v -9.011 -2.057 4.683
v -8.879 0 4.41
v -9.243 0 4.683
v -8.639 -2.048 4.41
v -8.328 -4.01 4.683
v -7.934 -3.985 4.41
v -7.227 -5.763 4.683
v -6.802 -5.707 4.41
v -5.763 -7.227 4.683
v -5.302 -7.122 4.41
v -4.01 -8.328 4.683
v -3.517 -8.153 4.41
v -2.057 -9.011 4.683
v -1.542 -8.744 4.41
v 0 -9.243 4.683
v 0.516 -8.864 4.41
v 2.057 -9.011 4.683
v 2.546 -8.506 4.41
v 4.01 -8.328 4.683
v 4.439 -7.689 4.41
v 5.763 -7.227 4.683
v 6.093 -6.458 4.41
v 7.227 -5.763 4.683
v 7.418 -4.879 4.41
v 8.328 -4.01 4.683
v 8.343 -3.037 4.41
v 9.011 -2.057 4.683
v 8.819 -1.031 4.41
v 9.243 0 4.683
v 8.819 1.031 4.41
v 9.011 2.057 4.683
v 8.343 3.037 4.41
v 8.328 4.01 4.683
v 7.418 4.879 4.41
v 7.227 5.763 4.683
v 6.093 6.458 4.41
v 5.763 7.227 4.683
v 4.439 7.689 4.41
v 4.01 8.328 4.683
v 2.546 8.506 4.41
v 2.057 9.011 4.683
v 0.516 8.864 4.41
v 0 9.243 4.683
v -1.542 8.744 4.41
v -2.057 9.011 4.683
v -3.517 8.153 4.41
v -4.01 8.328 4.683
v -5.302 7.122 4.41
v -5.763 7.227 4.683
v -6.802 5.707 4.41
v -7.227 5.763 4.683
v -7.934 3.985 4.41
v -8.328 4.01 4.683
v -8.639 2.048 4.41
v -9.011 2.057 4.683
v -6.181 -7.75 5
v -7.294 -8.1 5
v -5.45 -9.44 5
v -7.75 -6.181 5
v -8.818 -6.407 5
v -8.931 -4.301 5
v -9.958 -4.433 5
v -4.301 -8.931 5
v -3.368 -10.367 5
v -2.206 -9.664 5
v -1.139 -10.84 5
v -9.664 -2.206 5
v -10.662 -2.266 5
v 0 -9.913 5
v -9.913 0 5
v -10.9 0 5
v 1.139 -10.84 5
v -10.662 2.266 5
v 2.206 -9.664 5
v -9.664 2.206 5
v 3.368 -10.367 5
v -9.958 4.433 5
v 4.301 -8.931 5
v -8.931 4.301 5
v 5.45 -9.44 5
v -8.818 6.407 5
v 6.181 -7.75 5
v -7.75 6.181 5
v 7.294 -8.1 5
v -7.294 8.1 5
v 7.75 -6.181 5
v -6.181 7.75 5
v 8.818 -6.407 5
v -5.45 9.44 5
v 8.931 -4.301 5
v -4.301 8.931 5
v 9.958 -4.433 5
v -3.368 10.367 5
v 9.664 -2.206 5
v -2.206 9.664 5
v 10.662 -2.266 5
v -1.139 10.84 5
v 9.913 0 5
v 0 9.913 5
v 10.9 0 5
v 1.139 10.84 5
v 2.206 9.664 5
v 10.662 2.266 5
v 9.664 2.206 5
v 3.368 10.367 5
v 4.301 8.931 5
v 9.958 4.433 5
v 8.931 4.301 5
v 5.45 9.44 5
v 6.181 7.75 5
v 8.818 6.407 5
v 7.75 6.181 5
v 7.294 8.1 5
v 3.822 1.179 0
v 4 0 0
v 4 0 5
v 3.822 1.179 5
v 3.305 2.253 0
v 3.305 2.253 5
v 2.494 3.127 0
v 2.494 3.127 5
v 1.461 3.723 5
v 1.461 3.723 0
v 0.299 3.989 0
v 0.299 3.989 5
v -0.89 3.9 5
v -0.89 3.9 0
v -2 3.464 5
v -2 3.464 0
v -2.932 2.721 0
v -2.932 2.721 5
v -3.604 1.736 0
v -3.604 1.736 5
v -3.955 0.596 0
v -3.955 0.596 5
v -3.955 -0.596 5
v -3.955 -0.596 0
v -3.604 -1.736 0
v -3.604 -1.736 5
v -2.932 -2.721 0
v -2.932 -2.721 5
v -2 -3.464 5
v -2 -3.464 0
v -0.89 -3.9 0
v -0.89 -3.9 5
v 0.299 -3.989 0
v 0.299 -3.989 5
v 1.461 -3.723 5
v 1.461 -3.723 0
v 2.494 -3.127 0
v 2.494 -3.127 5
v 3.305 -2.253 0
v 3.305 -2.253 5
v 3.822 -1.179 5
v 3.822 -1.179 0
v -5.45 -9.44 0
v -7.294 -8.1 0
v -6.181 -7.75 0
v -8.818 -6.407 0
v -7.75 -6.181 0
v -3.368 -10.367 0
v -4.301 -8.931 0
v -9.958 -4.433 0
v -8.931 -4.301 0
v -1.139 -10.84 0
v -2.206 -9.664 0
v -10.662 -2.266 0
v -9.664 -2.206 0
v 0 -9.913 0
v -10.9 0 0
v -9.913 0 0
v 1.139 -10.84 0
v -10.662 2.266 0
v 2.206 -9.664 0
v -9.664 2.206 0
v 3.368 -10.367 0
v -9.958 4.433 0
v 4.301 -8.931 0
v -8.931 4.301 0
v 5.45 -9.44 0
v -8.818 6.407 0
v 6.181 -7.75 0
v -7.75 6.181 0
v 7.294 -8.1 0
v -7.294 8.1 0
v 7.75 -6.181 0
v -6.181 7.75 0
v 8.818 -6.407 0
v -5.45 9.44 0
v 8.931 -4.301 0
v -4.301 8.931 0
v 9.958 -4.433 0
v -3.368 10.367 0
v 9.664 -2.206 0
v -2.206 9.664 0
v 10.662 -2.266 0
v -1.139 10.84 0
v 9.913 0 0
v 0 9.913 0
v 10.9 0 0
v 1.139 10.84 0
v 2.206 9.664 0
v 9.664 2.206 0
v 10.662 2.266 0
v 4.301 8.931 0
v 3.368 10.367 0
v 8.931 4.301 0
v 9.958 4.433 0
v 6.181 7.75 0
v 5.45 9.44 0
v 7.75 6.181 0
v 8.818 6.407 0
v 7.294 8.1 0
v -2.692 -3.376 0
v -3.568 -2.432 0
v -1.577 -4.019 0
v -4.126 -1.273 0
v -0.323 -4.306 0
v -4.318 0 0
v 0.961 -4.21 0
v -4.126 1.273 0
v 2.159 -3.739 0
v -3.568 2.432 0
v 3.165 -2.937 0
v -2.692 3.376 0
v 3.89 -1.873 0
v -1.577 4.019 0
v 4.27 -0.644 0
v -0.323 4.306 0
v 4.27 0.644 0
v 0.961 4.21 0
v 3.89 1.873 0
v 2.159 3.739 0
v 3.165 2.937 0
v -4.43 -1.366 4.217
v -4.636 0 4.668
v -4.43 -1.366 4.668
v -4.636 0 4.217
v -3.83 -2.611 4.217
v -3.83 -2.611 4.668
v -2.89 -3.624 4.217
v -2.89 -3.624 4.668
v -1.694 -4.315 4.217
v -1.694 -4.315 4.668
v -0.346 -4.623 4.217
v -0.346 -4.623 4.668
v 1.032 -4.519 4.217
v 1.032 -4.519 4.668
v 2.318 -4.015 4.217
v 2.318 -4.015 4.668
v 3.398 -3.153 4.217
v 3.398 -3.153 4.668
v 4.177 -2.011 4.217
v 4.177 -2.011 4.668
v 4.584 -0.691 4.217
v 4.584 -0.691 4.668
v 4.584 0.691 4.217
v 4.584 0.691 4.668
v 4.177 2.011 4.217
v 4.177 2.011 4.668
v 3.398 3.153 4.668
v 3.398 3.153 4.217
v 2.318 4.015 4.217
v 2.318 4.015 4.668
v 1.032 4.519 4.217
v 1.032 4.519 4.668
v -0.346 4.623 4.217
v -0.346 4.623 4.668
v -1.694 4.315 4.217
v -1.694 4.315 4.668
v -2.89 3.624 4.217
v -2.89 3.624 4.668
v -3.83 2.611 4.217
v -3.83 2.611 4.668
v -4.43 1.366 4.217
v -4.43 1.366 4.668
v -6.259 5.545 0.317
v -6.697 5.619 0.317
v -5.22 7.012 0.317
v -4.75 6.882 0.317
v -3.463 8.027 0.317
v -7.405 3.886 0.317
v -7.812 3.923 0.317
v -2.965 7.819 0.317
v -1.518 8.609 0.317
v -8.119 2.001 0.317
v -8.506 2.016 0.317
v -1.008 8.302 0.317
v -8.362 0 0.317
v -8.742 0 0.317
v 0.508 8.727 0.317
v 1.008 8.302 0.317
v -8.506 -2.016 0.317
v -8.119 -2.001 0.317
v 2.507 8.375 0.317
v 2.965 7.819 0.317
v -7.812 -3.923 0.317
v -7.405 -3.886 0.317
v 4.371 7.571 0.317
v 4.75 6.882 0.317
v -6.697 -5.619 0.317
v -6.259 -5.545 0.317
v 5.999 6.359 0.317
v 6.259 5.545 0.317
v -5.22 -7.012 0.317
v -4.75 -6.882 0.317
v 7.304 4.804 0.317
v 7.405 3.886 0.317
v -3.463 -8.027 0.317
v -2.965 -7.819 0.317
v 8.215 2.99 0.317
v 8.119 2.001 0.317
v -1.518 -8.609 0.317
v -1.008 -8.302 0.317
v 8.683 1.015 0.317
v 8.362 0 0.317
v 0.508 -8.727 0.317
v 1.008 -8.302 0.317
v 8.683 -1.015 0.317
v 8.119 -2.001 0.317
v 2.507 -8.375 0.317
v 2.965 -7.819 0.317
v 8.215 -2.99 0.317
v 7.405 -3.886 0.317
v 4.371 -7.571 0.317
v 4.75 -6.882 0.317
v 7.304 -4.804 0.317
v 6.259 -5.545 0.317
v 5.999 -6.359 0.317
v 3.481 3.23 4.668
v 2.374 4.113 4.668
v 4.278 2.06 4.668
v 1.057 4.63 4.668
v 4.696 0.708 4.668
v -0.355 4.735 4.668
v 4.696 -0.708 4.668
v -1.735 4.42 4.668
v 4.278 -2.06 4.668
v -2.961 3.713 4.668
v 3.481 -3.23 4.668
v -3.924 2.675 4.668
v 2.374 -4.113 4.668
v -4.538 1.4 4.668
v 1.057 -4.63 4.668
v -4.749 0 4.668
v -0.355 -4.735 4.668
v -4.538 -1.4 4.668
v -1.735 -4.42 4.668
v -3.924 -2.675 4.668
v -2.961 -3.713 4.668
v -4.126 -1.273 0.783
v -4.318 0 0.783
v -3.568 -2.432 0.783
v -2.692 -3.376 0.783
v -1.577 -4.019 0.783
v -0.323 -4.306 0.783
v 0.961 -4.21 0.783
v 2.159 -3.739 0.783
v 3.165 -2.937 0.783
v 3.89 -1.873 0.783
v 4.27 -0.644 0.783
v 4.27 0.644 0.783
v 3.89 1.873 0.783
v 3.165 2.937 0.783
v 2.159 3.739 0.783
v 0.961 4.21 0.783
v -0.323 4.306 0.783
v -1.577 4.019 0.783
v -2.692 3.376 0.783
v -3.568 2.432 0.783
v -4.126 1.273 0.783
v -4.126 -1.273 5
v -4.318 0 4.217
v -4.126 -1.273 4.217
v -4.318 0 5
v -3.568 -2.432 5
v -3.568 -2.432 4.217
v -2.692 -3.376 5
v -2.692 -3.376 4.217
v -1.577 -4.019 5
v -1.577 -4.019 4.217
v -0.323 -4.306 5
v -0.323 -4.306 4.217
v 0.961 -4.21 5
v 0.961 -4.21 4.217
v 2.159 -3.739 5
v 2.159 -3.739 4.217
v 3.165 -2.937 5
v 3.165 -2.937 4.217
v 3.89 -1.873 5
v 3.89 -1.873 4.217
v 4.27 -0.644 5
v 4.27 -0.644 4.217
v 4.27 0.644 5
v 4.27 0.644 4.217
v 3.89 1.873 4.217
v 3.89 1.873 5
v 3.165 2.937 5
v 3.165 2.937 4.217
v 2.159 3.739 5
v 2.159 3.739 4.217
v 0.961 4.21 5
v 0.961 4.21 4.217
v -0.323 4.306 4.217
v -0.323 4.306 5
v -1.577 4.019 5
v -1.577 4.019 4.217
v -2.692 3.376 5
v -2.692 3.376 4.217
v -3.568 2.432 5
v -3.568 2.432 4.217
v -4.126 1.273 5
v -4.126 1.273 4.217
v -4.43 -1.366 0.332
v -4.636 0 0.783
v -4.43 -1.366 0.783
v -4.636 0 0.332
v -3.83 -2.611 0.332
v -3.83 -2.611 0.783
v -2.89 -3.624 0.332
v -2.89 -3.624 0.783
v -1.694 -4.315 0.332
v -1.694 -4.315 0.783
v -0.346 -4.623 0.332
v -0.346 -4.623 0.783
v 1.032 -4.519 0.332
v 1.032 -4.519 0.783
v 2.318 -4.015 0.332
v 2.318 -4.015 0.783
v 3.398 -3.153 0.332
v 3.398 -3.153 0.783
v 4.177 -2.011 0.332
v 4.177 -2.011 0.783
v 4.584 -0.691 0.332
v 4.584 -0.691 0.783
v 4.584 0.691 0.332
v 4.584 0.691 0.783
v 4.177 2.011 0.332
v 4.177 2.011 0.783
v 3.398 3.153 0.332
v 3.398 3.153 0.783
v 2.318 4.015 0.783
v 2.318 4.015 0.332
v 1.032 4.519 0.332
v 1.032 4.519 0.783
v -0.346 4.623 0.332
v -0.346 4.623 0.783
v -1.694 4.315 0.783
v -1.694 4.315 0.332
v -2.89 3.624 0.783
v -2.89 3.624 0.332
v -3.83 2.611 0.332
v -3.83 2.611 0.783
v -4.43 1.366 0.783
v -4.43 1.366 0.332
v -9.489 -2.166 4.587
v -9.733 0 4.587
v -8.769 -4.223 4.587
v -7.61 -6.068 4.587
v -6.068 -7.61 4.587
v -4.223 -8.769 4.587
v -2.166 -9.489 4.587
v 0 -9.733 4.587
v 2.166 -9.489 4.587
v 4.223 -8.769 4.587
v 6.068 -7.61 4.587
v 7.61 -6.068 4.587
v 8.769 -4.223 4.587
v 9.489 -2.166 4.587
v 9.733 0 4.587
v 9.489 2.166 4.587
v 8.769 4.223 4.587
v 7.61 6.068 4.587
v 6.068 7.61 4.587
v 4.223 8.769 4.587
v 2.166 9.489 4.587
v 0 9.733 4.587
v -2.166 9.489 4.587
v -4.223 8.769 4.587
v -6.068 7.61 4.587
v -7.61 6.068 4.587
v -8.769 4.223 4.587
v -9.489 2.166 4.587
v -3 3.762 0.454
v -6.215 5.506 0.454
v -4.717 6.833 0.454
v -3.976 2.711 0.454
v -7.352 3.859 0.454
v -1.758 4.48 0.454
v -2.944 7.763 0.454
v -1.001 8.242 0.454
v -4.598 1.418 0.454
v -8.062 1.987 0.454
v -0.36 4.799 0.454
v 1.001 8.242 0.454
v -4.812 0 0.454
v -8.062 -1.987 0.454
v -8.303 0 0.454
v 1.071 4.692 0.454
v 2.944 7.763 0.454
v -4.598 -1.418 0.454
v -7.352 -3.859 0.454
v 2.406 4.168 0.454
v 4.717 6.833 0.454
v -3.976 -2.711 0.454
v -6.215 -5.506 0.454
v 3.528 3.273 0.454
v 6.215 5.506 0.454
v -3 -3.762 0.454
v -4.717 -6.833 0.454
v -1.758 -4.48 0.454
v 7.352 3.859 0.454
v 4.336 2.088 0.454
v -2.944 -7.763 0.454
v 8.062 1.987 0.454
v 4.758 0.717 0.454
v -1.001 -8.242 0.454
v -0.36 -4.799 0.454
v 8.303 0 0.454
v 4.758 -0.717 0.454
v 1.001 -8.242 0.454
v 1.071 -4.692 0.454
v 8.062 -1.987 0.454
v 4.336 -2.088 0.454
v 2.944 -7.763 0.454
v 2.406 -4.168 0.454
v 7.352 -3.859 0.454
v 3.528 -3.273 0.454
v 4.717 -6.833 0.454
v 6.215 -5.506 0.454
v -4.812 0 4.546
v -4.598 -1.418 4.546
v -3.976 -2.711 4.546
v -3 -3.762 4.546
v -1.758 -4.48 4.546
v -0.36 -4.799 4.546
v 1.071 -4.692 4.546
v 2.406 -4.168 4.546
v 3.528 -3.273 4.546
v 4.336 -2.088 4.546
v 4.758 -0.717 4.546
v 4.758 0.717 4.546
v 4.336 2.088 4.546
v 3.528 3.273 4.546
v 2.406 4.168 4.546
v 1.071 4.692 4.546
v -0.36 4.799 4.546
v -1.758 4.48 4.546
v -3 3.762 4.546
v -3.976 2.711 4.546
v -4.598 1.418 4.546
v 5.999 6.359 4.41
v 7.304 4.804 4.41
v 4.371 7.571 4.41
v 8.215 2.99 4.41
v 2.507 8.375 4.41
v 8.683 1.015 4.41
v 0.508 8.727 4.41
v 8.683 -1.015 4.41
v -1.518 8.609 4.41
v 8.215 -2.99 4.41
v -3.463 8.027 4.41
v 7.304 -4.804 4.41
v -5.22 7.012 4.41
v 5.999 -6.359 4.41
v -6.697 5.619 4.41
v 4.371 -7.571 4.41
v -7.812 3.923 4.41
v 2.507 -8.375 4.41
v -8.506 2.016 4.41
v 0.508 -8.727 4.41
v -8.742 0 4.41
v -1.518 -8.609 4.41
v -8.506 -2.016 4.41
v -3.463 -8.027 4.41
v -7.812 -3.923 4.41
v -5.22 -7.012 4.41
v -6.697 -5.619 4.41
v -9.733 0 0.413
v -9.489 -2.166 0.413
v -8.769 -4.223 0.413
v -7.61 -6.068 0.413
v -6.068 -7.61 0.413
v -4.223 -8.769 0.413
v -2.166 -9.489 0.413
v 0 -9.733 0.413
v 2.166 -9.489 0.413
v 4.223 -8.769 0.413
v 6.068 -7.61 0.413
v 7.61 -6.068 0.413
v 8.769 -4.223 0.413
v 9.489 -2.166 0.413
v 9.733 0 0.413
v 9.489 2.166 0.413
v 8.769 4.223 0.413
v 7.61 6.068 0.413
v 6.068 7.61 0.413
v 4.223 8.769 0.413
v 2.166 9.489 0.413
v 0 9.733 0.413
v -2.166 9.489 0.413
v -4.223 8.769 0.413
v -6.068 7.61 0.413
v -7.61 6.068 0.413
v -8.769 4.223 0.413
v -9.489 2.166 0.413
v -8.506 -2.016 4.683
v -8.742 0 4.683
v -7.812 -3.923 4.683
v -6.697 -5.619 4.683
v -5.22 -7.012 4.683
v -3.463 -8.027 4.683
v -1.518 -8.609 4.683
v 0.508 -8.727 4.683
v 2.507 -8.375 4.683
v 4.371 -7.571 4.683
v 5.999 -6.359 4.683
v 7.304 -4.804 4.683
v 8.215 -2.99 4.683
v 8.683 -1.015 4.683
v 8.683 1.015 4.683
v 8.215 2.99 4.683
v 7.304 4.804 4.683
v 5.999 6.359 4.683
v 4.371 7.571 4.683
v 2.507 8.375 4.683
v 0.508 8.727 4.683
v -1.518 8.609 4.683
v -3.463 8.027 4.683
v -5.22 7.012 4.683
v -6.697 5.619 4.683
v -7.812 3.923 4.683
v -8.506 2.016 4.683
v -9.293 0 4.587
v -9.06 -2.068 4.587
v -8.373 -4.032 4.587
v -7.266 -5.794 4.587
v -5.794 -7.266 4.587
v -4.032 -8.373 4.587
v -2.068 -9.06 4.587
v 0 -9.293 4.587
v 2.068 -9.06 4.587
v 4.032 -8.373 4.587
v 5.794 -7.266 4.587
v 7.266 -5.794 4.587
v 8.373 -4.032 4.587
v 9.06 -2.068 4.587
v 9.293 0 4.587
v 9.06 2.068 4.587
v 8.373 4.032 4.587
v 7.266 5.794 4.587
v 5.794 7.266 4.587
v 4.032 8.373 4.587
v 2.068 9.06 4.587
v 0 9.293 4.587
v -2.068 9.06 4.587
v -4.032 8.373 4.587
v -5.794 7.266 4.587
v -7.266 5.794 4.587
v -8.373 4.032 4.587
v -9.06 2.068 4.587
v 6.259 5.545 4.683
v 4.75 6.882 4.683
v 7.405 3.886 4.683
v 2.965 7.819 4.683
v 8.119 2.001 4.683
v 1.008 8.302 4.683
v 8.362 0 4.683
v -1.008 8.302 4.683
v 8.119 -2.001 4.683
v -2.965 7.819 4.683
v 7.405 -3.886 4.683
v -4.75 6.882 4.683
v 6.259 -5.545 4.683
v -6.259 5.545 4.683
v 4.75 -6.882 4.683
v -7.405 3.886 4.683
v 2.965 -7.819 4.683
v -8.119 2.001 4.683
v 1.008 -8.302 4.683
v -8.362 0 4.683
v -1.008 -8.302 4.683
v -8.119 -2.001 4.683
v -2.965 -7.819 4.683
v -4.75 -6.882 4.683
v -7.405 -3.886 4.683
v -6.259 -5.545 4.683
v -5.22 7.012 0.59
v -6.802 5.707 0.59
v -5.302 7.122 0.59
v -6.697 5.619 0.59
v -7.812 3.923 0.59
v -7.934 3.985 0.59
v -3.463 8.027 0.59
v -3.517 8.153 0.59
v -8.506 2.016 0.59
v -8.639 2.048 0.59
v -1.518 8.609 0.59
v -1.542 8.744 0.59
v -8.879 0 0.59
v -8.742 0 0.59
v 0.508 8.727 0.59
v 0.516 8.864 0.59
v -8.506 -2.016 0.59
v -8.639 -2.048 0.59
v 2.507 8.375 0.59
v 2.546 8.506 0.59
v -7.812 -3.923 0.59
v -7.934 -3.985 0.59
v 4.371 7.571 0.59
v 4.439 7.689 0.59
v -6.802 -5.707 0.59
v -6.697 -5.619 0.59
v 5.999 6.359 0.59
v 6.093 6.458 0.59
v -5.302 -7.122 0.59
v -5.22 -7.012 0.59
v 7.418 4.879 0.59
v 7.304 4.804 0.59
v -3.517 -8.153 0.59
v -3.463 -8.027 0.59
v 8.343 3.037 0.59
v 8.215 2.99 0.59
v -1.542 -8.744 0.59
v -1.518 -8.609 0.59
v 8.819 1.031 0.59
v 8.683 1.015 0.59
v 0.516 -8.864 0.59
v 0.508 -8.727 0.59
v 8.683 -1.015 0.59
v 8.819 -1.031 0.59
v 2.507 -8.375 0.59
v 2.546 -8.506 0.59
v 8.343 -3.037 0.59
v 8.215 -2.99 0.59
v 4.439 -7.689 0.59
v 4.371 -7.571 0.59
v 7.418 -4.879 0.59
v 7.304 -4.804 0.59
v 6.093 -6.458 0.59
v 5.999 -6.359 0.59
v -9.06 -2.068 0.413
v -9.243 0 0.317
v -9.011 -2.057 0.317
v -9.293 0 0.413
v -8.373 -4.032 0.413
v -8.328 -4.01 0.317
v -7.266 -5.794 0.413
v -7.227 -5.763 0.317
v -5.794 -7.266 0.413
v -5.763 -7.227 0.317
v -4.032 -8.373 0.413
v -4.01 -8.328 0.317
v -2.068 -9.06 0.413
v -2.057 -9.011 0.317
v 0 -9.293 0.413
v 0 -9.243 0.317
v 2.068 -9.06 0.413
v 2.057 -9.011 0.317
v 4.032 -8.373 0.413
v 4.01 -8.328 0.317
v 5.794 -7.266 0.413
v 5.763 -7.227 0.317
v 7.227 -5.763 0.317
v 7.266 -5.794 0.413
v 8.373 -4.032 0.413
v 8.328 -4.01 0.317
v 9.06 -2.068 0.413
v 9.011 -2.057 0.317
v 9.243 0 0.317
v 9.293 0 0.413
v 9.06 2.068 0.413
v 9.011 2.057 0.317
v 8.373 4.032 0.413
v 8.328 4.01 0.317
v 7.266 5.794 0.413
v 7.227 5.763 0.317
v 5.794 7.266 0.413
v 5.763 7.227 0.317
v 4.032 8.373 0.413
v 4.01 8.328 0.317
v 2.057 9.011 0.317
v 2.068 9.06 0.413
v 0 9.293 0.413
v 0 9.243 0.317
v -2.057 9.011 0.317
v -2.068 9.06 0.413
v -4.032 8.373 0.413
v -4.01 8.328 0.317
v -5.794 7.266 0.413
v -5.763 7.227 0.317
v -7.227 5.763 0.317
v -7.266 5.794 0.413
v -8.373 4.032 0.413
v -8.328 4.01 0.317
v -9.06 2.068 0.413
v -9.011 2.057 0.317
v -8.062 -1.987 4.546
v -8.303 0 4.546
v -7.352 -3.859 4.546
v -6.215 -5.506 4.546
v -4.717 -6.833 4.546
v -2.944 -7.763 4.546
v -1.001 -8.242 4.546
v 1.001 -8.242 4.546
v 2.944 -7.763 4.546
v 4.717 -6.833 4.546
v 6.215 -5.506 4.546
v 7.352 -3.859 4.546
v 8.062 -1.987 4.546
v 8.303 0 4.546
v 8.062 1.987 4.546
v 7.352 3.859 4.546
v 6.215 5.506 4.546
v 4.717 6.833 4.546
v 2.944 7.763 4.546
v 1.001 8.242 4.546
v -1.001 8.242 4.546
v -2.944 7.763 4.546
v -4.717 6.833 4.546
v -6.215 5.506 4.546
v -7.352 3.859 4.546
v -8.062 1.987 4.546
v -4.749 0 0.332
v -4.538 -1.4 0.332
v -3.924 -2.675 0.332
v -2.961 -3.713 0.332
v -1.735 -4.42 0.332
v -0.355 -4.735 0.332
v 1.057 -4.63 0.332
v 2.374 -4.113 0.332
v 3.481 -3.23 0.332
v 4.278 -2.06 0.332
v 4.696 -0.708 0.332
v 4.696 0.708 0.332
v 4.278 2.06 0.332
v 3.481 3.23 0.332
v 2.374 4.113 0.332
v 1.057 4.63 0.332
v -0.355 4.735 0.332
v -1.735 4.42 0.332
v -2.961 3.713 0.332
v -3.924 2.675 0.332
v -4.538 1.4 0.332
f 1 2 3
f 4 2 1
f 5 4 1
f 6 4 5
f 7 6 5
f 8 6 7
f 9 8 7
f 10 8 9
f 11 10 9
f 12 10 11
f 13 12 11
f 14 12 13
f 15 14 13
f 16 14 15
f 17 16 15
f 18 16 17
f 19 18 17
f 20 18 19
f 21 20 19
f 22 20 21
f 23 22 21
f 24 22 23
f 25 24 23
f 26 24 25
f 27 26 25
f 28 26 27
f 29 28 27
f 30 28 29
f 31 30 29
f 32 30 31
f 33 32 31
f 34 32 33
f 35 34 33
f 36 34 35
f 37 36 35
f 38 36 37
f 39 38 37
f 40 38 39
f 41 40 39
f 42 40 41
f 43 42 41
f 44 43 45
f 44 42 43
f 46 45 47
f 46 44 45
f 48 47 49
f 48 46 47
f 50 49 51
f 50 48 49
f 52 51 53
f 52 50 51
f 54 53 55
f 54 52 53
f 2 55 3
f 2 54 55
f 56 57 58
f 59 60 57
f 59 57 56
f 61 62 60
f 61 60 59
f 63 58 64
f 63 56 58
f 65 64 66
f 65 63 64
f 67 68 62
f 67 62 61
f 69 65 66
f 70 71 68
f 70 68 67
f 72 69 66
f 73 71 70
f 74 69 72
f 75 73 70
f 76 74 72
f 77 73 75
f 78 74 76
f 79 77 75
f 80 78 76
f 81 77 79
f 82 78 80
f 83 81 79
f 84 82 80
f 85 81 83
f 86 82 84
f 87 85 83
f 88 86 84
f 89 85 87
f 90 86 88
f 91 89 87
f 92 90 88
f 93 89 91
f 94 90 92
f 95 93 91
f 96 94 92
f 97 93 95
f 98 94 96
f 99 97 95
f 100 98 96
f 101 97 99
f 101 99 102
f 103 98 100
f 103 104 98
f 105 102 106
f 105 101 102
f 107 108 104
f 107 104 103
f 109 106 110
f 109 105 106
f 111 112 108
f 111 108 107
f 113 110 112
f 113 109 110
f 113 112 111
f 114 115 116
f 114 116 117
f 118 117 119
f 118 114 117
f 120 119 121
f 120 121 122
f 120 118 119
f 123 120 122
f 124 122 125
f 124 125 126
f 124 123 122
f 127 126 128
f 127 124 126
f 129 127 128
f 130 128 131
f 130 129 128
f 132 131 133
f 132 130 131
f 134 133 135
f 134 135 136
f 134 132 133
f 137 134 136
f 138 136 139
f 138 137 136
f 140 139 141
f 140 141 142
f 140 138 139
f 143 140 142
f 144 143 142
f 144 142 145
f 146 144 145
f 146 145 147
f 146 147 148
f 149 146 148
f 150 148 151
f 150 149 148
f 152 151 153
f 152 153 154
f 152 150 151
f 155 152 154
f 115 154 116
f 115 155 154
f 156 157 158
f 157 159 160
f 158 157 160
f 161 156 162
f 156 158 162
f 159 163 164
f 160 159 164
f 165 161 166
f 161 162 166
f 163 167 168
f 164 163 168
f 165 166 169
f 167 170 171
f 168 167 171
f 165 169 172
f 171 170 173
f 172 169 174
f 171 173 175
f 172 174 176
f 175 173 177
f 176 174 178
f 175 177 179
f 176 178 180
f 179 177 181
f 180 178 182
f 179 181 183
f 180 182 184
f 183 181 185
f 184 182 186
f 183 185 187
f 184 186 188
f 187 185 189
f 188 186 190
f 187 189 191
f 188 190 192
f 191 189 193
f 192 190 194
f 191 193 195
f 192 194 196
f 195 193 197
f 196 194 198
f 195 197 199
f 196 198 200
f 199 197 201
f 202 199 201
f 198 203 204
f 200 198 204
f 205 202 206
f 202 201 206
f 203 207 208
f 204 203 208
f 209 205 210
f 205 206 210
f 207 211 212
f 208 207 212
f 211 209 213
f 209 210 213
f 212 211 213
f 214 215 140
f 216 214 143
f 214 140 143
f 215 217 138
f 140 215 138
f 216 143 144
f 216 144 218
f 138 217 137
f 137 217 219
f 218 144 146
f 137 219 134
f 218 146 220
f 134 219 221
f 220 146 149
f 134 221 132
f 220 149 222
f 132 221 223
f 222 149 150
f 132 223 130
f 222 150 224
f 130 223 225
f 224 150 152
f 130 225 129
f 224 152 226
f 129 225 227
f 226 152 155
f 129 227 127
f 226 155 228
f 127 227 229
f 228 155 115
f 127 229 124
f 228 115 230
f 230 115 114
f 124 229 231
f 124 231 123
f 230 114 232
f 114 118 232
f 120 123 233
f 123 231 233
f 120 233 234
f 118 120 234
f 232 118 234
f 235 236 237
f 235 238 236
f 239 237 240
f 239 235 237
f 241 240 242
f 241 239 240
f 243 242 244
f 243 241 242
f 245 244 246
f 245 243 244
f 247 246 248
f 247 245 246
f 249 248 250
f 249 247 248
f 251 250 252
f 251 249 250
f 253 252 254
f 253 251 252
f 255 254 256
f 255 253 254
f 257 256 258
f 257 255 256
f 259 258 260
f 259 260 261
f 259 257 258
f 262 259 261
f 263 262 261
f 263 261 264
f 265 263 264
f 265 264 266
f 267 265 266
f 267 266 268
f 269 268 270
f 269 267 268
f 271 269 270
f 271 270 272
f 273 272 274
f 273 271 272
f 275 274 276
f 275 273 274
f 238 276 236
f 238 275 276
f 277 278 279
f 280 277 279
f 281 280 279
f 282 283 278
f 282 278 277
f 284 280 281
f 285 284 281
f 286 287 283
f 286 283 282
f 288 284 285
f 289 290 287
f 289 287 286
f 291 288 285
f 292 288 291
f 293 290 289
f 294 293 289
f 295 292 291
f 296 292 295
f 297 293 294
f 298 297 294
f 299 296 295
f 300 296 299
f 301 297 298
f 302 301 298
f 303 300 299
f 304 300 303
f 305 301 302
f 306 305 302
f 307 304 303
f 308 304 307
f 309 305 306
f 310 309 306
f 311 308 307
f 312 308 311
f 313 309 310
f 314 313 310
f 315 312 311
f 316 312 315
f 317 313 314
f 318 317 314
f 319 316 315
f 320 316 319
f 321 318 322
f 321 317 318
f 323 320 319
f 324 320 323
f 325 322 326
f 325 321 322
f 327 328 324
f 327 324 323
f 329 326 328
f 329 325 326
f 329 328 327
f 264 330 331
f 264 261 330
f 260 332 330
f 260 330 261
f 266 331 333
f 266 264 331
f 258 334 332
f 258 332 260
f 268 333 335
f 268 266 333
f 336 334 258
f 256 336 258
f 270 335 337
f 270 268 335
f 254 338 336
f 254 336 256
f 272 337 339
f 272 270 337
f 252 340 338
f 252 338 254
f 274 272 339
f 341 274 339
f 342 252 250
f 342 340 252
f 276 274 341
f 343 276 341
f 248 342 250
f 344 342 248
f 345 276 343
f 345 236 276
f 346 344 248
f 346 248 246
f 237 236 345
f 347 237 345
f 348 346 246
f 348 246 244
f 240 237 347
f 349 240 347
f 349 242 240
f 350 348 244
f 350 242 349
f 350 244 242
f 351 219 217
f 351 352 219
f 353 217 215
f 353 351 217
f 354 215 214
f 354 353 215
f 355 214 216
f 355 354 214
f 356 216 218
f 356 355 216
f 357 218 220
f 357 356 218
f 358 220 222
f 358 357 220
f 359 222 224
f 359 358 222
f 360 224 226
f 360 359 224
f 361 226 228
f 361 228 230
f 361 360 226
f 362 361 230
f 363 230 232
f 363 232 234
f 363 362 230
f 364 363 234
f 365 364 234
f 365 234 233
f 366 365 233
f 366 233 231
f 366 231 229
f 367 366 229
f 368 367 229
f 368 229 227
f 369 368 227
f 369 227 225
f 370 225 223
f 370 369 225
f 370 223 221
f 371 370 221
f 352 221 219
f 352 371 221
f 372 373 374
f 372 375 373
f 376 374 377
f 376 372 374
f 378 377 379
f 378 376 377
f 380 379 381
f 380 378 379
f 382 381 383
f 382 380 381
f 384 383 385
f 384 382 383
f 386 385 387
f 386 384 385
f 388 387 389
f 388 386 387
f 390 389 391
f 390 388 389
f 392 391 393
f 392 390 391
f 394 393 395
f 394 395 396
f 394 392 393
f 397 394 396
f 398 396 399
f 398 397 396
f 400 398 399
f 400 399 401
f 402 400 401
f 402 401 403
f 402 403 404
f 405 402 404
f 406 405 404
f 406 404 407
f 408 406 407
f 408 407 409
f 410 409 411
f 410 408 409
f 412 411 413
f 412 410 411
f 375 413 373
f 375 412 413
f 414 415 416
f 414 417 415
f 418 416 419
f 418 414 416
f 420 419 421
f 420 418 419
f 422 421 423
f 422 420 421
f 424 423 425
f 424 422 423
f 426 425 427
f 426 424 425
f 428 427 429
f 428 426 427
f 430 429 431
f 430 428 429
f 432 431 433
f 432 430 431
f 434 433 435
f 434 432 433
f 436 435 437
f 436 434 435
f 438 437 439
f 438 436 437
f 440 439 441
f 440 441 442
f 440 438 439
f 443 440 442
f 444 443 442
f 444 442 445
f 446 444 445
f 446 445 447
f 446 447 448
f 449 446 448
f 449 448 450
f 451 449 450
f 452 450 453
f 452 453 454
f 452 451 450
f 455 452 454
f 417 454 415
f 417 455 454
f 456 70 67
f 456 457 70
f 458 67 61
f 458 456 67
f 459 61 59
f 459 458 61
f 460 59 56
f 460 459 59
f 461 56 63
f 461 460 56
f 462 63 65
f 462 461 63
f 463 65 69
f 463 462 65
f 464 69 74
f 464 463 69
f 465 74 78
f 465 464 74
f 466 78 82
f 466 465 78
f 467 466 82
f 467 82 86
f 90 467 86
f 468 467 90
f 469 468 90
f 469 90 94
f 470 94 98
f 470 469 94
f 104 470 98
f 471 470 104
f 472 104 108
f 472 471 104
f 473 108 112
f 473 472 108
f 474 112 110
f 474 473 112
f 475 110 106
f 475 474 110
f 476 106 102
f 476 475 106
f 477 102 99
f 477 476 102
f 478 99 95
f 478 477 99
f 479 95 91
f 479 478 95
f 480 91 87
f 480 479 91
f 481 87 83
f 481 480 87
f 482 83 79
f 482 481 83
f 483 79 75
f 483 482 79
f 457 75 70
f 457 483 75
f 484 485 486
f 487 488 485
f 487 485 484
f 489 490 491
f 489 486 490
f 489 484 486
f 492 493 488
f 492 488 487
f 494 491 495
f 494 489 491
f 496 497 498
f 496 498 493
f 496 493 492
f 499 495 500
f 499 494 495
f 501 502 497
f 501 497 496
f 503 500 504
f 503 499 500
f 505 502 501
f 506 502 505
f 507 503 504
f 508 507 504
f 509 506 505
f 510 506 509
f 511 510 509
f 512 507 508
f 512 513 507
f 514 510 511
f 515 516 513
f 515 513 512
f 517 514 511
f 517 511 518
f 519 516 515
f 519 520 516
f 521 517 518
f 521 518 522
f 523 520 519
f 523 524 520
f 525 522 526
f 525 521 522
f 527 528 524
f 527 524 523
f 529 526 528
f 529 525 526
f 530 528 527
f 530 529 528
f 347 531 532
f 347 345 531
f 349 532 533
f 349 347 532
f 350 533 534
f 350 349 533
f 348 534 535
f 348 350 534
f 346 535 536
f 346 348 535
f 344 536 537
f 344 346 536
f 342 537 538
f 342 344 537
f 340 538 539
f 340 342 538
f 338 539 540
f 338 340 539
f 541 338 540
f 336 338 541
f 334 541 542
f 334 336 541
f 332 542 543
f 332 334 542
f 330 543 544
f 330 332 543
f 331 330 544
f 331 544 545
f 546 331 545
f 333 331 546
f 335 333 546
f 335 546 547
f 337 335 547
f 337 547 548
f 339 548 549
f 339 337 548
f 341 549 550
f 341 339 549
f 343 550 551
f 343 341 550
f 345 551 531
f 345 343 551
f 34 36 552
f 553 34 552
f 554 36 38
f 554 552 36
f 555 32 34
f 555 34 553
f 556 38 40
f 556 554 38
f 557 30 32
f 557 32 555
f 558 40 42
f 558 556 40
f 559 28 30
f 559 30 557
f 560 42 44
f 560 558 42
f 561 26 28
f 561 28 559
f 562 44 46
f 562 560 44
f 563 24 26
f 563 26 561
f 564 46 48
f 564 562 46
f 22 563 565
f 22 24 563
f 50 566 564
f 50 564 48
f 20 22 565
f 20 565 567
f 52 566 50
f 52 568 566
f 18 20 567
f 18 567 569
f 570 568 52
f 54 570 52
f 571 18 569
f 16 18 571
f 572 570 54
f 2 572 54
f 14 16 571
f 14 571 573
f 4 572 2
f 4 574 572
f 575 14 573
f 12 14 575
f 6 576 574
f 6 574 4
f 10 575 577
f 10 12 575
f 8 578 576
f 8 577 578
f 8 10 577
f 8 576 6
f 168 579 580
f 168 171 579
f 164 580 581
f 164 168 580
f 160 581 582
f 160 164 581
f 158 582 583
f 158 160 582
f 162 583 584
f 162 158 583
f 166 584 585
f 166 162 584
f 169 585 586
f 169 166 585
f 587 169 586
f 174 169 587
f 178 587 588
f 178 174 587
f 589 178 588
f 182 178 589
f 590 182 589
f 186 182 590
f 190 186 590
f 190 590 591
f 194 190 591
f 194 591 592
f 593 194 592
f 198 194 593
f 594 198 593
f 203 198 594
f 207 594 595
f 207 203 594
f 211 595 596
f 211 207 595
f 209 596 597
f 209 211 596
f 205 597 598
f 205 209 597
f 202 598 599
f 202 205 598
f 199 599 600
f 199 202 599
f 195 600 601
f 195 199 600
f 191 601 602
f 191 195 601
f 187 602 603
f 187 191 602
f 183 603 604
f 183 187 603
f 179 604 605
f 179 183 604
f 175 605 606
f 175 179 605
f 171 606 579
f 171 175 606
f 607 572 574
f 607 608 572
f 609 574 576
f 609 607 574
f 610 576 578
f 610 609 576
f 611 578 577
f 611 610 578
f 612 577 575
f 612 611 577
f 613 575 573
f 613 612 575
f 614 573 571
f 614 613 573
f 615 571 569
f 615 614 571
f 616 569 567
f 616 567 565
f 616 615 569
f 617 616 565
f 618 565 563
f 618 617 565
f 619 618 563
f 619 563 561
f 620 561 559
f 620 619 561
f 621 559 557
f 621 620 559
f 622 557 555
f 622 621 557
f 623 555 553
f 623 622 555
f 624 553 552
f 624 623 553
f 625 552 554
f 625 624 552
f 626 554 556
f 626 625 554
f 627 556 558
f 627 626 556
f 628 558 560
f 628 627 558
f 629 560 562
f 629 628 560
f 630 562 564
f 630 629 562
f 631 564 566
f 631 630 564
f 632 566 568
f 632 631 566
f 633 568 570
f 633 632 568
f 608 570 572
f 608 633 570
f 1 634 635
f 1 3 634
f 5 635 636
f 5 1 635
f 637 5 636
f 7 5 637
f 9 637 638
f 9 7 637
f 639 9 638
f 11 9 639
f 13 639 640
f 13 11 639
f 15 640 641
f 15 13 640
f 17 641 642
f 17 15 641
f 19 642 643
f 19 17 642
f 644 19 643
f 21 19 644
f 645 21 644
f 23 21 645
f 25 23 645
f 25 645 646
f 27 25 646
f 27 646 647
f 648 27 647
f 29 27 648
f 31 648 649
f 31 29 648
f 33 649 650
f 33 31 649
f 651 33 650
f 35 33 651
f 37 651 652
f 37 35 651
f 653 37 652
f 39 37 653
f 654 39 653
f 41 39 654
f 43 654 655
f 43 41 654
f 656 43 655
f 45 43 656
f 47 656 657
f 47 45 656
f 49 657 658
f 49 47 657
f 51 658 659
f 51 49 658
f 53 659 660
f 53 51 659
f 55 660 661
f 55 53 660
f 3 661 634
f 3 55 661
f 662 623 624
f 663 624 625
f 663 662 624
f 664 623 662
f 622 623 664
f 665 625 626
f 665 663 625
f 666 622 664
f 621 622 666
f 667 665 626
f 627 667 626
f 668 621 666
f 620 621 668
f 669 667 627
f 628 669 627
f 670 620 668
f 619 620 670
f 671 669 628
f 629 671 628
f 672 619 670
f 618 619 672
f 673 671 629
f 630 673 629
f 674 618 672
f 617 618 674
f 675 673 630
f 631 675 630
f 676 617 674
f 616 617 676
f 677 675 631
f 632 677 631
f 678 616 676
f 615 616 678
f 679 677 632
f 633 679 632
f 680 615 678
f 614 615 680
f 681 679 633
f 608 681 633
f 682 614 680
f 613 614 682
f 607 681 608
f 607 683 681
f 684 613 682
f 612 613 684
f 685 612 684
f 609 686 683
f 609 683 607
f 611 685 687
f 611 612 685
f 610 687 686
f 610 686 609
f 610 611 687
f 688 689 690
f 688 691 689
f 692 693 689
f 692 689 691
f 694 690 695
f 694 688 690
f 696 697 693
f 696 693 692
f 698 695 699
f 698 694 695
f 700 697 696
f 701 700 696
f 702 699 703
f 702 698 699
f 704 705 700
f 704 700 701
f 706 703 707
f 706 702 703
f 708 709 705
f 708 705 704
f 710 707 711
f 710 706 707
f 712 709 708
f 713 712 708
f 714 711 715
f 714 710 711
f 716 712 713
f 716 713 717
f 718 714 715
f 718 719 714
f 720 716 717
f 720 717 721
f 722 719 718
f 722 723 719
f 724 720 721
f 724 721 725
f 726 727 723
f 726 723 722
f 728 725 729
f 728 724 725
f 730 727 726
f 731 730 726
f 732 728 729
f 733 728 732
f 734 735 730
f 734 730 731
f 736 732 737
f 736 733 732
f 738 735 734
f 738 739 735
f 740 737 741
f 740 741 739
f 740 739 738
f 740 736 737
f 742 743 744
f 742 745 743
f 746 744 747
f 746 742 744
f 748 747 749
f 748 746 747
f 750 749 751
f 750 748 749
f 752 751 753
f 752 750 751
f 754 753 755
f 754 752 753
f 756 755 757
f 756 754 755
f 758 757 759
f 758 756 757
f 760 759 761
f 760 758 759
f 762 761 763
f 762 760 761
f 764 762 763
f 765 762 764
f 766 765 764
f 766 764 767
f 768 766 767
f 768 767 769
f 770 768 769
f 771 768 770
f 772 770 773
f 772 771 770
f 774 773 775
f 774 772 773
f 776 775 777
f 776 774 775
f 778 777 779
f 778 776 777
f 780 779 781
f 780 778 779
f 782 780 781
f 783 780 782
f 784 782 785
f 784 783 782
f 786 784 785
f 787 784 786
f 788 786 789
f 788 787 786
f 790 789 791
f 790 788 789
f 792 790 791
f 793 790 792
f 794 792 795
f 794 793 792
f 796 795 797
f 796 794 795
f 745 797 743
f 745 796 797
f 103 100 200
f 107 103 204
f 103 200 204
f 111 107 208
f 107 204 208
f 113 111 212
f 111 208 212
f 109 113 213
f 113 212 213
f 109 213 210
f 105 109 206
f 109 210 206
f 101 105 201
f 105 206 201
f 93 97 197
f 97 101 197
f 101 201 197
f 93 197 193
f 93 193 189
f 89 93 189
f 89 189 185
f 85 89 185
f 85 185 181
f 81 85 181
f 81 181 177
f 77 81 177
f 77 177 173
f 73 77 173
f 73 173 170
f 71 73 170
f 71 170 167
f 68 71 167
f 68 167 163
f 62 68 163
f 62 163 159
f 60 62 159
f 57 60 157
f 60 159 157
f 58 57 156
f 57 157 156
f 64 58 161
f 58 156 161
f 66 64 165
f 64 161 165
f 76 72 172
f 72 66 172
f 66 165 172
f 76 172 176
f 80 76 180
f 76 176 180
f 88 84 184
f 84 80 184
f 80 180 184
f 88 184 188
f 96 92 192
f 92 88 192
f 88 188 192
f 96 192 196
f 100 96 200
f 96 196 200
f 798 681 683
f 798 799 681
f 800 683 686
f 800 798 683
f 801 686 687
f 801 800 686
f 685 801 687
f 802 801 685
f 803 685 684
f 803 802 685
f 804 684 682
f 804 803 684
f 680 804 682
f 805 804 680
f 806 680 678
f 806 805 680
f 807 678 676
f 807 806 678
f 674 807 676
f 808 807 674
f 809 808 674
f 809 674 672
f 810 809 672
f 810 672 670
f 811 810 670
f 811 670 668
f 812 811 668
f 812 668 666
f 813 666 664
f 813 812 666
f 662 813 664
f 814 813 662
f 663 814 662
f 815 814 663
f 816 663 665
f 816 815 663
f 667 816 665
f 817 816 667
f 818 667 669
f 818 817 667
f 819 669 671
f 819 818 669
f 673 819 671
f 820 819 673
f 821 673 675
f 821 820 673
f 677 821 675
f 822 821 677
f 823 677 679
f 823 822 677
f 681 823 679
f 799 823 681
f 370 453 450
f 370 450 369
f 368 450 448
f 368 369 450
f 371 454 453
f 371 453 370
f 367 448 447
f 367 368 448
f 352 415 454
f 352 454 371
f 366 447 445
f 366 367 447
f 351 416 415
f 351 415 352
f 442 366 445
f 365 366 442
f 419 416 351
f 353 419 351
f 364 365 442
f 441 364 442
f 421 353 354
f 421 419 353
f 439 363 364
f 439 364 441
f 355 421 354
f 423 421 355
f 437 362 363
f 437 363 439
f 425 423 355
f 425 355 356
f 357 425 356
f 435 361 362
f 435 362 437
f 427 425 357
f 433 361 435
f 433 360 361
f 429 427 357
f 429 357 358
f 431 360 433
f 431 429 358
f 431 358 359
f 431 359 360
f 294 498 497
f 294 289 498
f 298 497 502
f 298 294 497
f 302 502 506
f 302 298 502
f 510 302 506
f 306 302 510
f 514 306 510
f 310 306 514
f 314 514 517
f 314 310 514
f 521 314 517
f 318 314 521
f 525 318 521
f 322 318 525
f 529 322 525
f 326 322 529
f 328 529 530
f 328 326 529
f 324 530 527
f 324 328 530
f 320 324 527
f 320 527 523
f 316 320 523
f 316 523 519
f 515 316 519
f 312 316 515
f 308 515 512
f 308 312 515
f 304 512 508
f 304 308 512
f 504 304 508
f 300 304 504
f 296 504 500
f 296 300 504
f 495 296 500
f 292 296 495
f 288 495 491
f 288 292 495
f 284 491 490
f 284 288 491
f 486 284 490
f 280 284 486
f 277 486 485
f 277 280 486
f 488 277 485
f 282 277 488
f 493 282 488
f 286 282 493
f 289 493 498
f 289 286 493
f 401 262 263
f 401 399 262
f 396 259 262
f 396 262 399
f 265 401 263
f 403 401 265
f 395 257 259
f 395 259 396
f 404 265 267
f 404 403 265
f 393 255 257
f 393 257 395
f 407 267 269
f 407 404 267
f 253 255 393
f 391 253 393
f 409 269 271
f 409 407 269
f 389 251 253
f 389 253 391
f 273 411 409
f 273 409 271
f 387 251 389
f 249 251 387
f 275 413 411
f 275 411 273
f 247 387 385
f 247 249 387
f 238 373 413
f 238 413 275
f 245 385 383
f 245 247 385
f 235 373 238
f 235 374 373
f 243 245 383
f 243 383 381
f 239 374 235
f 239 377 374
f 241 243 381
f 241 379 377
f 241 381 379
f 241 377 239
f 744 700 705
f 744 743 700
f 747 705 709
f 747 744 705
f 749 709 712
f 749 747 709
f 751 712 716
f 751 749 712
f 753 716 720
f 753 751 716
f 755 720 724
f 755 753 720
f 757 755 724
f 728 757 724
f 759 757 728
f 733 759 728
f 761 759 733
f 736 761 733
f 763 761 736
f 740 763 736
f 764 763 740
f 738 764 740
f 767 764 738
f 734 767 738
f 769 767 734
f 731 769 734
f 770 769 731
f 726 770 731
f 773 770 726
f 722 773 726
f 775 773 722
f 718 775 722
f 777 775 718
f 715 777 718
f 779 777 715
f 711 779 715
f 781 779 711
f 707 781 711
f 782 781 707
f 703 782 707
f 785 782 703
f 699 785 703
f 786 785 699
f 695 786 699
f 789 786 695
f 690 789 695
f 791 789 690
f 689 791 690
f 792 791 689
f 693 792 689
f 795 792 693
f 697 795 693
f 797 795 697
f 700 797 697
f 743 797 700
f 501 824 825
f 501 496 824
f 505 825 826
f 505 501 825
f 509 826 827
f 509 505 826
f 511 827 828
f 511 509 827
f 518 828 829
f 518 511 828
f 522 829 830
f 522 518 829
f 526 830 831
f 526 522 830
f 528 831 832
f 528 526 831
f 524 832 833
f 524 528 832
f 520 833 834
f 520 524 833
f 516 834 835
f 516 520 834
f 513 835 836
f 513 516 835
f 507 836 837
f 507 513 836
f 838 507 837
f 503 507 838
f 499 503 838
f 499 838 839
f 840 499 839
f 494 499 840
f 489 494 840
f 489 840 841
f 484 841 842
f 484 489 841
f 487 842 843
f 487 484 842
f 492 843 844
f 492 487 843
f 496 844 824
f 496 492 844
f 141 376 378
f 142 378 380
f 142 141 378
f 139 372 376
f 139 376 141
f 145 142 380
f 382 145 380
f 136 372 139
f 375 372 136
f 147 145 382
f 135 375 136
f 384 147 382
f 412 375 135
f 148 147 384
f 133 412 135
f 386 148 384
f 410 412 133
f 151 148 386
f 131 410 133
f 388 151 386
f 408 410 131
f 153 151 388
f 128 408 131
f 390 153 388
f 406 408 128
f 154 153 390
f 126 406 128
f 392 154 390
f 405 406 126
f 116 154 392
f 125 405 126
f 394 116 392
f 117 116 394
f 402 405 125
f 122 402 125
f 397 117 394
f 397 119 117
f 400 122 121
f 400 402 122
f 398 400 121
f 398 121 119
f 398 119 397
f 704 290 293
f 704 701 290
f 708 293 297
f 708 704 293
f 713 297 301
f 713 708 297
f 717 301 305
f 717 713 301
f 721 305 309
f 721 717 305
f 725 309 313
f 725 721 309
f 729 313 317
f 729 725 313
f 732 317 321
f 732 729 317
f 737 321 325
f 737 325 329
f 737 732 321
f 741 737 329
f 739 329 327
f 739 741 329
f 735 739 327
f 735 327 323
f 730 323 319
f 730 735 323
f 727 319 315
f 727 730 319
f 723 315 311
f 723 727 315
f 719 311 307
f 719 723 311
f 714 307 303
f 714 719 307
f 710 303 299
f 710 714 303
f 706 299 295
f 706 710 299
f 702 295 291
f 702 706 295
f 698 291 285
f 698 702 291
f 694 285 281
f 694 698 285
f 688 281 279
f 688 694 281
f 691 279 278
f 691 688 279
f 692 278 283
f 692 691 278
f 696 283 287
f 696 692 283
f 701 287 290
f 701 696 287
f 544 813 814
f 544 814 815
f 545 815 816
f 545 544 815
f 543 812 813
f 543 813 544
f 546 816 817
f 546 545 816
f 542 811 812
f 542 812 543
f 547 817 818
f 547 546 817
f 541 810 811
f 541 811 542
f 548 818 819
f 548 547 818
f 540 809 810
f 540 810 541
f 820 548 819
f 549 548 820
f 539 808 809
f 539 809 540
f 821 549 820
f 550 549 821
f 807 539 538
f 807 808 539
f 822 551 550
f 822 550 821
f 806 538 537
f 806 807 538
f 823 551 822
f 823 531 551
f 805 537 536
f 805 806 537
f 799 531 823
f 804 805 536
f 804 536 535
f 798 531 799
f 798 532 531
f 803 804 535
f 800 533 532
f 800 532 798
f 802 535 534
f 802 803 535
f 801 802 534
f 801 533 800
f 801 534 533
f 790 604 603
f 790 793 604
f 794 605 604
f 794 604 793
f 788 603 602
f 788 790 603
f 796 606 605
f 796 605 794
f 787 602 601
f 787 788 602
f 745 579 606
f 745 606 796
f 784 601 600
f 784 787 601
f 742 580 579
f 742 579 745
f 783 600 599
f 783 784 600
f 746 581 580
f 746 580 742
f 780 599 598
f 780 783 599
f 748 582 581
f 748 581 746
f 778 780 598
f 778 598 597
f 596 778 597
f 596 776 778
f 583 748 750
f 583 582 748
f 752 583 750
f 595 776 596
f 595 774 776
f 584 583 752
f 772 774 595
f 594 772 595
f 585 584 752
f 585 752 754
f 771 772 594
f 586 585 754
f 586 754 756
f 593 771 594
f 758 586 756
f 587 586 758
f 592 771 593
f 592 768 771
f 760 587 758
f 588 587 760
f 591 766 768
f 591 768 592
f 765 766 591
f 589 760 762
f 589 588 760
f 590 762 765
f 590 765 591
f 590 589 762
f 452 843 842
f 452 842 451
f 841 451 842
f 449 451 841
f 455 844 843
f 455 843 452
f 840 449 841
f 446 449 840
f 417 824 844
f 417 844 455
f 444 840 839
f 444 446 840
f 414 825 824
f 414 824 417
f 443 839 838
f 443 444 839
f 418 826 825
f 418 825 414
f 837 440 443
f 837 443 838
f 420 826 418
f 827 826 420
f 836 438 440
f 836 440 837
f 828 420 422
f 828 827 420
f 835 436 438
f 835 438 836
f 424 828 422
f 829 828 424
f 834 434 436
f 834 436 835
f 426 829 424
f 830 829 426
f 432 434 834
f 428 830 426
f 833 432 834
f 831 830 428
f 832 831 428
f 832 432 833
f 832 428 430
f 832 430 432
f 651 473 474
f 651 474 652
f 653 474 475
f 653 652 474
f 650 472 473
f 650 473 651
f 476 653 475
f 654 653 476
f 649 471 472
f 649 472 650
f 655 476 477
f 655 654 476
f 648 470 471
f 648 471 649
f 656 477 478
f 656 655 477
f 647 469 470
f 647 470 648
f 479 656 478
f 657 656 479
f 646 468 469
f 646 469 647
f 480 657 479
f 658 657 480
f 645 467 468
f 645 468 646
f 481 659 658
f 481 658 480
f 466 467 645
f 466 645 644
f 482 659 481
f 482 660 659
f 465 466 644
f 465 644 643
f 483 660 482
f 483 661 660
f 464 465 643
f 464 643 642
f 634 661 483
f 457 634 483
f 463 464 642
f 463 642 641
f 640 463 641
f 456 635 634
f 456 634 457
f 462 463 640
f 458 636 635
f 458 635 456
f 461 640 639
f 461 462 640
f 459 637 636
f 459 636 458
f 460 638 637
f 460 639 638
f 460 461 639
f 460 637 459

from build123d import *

# Parameters (mm, degrees)
SKETCH1_R           = 10.9
SKETCH1_R_2         = 4
BOSS_EXTRUDE1_DEPTH = 5


with BuildPart() as part:
    # Sketch1 → Boss-Extrude1 (new body)
    with BuildSketch(Plane.XY):
        Circle(SKETCH1_R)
        Circle(SKETCH1_R_2, mode=Mode.SUBTRACT)
    extrude(amount=BOSS_EXTRUDE1_DEPTH)

    # Sketch2 → Cut-Revolve1 (revolve, cut)
    with BuildSketch(Plane(origin=(0, 0, 0), x_dir=(1, 0, 0), z_dir=(0, 1, 0))):
        Polygon((-10.9, -5), (-9.912939245, -5), (-9.732966379, -4.586942685), (-9.293313352, -4.586942685), (-9.243161822, -4.682862035), (-8.878748767, -4.409552244), (-8.742093871, -4.409552244), (-8.742093871, -4.682862035), (-8.362496939, -4.682862035), (-8.302955146, -4.546207139), (-4.812245389, -4.546207139), (-4.748734143, -4.667678158), (-4.635669369, -4.667678158), (-4.635669369, -4.21672133), (-4.317834685, -4.21672133), (-4.317834685, -5), (-6.380746686, -5.704606556), (-10.9, -5.809210272), align=None)
        Polygon((-6.380746686, 0.704606556), (-4.317834685, 0), (-4.317834685, -0.78327867), (-4.635669369, -0.78327867), (-4.635669369, -0.332321842), (-4.748734143, -0.332321842), (-4.812245389, -0.453792861), (-8.302955146, -0.453792861), (-8.362496939, -0.317137965), (-8.742093871, -0.317137965), (-8.742093871, -0.590447756), (-8.878748767, -0.590447756), (-9.243161822, -0.317137965), (-9.293313352, -0.413057315), (-9.732966379, -0.413057315), (-9.912939245, 0), (-10.9, 0), (-10.9, 0.809210272), align=None)
    revolve(axis=Axis((0, 0, 0), (0, 0, 1)), mode=Mode.SUBTRACT)


solid = part.part
